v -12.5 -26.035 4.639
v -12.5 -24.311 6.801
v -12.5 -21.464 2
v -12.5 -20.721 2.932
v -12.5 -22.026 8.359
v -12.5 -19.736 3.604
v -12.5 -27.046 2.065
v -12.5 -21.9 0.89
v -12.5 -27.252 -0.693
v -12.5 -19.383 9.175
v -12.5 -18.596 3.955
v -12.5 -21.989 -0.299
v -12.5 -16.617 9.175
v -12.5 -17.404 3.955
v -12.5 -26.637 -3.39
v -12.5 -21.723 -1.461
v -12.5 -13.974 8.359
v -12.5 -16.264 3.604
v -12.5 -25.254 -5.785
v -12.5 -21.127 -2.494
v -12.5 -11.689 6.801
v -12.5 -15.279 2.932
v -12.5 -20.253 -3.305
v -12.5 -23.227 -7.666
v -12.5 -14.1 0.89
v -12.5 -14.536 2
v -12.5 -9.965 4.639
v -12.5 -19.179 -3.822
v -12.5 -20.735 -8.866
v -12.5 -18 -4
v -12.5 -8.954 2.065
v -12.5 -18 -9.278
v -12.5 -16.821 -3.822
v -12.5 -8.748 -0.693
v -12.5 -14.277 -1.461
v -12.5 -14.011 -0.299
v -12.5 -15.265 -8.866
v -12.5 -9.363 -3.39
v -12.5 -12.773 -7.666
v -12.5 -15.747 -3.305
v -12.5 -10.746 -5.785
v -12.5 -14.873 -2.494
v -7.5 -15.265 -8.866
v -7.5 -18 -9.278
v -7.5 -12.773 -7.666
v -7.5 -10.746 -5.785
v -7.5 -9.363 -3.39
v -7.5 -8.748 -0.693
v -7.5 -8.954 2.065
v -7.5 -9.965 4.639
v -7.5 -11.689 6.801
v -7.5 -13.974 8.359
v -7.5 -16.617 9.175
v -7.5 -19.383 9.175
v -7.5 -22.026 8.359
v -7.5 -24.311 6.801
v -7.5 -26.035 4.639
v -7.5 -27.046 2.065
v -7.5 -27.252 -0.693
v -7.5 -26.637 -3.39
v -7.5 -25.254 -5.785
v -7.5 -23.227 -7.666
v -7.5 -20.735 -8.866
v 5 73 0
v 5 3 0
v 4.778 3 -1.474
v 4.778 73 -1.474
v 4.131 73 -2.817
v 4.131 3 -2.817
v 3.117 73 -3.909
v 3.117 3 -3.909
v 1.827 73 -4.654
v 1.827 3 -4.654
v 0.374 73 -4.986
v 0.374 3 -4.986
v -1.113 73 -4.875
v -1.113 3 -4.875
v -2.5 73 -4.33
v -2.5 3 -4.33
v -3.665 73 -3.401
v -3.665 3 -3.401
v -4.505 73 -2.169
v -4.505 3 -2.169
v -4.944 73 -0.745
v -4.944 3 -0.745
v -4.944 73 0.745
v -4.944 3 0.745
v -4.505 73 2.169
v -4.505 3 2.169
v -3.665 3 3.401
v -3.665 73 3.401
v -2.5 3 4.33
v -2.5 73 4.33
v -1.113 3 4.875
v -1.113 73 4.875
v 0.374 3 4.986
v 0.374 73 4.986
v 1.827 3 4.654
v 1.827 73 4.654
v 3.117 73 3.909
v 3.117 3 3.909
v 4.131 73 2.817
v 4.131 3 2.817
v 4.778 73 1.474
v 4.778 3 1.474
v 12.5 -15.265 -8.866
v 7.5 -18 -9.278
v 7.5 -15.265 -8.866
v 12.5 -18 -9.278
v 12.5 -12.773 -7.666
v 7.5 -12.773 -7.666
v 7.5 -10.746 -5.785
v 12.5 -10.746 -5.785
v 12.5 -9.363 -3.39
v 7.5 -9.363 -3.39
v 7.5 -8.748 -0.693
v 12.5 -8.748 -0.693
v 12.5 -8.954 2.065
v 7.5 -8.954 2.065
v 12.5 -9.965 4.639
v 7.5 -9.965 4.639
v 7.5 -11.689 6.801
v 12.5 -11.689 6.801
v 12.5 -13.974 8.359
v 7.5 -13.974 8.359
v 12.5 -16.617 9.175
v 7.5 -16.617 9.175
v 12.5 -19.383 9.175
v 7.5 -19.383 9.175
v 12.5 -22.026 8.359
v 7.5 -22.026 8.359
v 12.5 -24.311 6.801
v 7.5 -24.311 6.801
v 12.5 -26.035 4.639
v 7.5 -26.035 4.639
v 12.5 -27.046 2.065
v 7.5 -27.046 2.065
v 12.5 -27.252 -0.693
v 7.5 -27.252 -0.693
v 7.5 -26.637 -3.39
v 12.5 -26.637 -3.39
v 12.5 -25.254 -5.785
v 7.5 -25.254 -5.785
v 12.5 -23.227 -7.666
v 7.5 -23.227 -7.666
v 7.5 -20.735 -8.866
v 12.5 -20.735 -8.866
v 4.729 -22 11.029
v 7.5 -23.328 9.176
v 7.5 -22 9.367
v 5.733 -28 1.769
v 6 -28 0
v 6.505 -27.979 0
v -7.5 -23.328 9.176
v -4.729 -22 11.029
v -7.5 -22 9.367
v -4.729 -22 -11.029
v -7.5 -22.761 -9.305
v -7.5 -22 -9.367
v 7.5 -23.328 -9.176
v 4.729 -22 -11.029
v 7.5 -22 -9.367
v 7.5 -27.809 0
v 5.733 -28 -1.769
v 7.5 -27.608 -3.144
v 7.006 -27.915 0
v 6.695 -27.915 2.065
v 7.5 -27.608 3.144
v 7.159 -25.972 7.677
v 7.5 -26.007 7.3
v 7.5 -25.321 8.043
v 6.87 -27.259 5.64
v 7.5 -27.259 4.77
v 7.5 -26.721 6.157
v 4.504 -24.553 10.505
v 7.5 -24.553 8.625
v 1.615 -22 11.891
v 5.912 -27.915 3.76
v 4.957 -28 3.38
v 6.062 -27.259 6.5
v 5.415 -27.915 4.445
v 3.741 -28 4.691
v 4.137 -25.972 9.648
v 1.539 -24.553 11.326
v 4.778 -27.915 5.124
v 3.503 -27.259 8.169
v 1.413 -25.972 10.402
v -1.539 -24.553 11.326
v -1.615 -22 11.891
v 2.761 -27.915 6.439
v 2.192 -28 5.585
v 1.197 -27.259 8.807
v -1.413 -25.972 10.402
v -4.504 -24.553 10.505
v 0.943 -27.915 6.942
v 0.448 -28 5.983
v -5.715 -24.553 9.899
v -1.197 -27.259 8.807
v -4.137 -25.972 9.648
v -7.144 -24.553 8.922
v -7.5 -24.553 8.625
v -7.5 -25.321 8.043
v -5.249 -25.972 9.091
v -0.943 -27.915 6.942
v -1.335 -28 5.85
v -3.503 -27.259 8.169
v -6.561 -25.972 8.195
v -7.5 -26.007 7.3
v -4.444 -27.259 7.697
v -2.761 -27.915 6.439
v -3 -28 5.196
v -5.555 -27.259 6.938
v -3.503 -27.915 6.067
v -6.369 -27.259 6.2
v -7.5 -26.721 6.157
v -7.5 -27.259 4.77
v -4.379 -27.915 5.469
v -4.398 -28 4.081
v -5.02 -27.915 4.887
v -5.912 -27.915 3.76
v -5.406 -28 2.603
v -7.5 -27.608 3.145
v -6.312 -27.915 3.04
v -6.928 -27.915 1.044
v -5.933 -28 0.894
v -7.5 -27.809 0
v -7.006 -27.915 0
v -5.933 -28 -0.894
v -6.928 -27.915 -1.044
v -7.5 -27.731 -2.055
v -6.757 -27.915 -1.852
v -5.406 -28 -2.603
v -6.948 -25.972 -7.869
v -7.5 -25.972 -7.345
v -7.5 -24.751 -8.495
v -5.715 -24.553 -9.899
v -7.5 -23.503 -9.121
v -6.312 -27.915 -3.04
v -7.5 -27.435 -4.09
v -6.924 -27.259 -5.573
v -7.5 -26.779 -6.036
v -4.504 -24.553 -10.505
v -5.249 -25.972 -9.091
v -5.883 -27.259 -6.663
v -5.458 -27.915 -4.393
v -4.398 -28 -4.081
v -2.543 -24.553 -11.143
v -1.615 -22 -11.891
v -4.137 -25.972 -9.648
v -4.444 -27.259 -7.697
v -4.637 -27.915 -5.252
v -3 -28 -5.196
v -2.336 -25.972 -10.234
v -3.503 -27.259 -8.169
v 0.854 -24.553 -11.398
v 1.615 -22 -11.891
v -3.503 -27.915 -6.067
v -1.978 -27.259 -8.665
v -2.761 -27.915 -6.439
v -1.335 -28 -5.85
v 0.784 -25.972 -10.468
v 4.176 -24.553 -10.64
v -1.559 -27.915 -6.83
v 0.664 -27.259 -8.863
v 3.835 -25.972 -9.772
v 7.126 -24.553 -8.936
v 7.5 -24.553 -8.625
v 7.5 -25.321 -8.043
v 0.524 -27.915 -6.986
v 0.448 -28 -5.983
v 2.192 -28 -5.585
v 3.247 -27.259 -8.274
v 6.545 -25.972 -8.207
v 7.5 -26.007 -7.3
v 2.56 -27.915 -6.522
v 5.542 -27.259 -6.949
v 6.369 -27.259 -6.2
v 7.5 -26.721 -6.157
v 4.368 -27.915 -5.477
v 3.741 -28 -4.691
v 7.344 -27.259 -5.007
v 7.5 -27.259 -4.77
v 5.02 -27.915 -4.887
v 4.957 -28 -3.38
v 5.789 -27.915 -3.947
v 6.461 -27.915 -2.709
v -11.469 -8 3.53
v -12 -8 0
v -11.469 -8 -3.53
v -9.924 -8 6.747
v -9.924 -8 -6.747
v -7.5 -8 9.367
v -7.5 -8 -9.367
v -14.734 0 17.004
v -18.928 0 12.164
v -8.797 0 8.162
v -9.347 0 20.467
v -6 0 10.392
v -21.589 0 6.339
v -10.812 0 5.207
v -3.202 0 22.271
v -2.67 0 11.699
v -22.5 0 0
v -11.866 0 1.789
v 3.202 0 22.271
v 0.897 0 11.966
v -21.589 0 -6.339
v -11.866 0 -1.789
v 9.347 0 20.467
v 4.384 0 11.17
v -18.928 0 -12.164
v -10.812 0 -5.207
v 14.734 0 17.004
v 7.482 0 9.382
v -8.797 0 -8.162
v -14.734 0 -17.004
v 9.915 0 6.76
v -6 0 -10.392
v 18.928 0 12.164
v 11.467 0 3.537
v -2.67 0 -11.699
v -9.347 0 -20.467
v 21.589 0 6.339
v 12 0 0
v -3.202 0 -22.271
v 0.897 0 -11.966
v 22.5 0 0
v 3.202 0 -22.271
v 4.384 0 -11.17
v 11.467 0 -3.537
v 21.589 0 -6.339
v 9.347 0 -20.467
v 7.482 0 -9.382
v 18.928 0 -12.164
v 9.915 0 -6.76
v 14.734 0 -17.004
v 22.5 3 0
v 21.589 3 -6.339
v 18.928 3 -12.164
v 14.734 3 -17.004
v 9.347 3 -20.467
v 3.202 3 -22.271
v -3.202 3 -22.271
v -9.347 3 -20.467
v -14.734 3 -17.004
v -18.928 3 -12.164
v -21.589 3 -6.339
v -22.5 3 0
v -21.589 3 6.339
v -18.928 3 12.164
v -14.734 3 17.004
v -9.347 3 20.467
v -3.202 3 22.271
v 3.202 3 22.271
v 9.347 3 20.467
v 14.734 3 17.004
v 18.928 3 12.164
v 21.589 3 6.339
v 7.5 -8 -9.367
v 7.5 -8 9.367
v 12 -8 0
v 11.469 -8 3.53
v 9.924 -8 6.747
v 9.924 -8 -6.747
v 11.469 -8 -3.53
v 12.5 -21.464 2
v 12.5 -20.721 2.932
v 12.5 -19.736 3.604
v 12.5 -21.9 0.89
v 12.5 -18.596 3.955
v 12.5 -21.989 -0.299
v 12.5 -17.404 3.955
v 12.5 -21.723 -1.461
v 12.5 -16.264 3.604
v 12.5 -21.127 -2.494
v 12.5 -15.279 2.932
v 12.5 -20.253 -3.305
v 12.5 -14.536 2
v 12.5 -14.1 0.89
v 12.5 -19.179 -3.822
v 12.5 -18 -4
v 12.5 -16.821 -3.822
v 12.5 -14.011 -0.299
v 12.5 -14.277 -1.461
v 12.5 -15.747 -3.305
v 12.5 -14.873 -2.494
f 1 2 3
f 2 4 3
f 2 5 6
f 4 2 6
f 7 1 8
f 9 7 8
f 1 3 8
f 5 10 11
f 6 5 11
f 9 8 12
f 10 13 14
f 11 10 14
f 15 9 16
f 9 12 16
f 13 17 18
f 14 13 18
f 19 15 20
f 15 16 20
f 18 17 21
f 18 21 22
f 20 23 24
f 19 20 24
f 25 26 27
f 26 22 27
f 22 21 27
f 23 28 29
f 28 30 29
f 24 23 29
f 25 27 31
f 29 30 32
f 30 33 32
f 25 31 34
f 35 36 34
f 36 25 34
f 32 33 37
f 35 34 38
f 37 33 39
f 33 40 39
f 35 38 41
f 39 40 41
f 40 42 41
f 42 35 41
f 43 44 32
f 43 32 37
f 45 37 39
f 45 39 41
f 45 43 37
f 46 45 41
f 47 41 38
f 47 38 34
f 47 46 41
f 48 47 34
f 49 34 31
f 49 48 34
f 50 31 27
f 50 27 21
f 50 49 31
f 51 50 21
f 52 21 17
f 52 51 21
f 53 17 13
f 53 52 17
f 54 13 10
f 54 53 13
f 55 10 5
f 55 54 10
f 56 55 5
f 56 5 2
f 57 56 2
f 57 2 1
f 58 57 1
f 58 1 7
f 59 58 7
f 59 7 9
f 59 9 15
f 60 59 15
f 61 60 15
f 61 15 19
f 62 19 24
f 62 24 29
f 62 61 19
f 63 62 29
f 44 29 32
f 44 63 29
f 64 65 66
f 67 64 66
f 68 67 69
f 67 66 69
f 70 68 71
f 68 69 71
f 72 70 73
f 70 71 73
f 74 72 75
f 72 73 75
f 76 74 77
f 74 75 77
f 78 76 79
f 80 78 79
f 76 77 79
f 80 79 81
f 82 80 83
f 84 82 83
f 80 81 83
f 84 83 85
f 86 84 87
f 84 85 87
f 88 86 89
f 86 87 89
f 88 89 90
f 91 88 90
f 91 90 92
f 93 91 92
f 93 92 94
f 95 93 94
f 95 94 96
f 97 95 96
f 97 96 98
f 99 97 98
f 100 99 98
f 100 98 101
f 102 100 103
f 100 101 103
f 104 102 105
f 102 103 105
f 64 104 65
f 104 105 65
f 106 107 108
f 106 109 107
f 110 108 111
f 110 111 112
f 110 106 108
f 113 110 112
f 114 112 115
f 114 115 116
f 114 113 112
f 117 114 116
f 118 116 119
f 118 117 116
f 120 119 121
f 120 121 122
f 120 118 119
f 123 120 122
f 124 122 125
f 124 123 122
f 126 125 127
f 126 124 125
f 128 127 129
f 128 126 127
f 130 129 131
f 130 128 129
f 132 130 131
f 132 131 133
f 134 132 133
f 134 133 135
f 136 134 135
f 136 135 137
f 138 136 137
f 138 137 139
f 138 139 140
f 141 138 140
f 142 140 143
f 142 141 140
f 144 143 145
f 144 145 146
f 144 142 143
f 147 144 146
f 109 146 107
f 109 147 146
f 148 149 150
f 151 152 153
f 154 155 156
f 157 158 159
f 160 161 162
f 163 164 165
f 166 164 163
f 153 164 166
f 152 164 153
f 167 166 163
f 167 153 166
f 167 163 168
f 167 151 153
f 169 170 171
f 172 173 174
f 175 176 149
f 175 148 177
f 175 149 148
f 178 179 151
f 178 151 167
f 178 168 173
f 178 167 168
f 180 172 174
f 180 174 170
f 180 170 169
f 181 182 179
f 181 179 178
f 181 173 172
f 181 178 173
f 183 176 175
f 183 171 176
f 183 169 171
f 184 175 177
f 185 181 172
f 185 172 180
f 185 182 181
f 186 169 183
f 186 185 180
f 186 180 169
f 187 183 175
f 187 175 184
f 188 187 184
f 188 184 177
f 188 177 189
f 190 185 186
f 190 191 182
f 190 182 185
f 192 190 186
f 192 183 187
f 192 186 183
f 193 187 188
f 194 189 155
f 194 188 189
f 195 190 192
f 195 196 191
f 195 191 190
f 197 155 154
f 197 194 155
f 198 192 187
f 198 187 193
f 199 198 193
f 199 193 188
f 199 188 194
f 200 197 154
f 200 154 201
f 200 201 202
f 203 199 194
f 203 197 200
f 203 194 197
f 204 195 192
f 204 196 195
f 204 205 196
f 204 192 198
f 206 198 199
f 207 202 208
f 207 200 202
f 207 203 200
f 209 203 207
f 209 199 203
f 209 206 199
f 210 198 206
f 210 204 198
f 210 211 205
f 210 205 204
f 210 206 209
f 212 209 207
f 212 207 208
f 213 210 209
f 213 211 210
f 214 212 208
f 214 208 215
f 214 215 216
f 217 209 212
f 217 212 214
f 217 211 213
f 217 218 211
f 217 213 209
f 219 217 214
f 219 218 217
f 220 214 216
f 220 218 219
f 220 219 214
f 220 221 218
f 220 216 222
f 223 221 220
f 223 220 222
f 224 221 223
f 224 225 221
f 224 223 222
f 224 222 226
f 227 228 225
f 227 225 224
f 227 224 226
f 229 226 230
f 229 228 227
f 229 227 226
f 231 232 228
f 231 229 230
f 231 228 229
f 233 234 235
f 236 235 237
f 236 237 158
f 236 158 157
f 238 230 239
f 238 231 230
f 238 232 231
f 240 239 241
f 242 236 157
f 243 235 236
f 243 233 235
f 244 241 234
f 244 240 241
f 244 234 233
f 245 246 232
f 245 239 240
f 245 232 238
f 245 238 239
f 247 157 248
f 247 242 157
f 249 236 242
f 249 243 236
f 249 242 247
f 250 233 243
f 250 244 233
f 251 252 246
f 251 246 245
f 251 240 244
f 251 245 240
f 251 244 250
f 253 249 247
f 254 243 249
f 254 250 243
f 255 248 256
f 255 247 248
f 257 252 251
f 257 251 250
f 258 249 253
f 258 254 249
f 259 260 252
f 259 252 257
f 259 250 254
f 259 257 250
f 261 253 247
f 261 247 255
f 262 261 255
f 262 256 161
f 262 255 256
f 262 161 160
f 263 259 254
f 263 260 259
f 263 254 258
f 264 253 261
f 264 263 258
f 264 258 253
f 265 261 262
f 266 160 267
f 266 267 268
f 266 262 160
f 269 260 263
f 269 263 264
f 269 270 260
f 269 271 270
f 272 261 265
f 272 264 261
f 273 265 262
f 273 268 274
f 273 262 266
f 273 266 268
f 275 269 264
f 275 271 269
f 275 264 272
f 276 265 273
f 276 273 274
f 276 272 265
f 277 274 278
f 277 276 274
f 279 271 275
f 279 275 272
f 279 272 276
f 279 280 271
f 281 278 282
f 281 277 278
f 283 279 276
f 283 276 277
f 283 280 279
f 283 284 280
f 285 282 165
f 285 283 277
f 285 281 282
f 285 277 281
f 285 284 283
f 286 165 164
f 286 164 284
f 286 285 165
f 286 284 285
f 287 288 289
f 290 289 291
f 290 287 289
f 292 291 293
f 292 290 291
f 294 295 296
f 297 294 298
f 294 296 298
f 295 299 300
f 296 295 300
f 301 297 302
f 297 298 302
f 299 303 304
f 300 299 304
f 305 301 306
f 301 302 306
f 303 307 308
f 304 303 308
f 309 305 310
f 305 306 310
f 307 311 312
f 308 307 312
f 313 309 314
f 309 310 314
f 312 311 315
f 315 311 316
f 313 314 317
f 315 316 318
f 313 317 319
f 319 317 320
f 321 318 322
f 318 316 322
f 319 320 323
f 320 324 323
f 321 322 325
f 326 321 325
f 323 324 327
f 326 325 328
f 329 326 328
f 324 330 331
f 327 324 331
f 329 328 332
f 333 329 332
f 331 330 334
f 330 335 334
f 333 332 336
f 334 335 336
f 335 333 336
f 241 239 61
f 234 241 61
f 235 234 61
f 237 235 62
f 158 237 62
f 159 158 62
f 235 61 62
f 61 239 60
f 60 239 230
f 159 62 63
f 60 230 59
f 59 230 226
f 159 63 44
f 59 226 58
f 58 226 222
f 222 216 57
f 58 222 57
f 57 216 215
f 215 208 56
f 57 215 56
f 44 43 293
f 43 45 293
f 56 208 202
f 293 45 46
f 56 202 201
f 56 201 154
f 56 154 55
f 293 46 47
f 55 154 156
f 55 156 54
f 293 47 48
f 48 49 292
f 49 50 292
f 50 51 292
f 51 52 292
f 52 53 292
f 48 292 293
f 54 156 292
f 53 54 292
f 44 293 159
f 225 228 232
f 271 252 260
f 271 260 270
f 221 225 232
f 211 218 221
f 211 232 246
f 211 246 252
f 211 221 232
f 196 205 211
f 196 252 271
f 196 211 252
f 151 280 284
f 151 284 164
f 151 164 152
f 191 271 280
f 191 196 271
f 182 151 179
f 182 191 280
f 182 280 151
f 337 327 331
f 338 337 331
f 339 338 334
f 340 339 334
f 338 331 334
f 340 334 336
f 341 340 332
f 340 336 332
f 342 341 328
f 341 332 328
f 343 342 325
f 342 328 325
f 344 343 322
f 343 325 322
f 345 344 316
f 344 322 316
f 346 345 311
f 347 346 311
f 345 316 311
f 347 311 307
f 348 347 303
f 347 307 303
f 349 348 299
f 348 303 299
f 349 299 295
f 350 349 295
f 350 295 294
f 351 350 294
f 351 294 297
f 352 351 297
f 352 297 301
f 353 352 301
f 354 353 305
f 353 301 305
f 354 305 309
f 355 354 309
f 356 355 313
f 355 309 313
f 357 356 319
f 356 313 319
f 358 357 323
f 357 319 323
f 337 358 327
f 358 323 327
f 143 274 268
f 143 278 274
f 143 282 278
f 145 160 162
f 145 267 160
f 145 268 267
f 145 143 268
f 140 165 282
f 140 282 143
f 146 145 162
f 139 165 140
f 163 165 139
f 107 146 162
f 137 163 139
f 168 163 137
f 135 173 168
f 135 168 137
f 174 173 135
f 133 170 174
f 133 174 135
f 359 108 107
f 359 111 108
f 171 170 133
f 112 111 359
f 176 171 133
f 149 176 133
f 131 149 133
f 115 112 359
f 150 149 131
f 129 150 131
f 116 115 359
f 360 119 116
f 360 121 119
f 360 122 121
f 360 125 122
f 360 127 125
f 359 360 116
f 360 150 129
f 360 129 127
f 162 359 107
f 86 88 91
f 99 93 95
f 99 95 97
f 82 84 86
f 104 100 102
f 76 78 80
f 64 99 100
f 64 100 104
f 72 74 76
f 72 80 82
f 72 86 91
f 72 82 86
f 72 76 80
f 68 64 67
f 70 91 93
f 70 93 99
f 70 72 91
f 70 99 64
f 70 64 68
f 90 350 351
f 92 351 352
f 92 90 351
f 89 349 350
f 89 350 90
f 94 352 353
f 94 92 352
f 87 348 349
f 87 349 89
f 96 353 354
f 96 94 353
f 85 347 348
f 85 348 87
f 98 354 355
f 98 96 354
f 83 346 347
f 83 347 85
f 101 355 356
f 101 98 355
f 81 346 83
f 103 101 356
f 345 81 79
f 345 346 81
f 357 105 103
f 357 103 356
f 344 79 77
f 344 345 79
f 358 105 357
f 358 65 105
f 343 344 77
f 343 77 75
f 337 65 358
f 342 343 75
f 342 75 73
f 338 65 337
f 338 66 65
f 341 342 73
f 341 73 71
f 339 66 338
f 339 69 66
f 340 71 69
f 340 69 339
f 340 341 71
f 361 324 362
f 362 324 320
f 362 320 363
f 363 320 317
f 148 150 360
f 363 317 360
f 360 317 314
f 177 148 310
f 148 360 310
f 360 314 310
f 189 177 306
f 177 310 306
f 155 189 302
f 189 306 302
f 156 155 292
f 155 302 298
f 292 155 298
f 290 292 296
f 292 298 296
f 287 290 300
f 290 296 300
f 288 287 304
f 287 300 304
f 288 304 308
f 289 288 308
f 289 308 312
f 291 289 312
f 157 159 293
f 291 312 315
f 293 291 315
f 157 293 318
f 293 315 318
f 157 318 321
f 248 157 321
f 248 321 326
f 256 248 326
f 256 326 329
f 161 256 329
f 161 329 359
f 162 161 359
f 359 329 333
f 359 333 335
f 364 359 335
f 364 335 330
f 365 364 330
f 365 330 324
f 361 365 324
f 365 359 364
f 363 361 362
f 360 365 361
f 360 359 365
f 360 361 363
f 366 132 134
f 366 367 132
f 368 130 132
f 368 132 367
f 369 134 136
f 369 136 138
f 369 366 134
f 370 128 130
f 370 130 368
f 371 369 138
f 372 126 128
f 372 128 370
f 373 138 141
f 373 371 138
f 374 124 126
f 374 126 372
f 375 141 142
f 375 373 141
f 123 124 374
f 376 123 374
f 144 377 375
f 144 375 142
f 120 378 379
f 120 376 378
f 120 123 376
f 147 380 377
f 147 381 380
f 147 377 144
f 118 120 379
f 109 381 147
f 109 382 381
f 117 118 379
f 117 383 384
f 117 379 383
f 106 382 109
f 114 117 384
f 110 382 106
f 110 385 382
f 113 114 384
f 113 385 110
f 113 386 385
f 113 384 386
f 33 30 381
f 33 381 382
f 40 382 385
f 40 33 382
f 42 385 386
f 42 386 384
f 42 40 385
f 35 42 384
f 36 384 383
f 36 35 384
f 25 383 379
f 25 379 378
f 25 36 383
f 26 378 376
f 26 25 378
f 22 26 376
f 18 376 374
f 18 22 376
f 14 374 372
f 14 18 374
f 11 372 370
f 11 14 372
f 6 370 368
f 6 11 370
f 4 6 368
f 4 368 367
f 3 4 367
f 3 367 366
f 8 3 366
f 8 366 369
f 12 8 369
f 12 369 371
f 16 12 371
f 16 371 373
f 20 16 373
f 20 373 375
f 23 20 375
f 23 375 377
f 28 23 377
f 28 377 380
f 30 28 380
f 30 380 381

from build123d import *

# Parameters (mm, degrees)
SKETCH1_R               = 22.5
BOSS_EXTRUDE3_DEPTH     = 3
SKETCH3_R               = 5
BOSS_EXTRUDE4_DEPTH     = 70
SKETCH4_R               = 12
BOSS_EXTRUDE5_DEPTH     = 28
FILLET1_R               = 6
SKETCH6_W               = 20
SKETCH6_H               = 20
CUT_EXTRUDE1_DEPTH      = 23.5
CUT_EXTRUDE1_DEPTH_BACK = 23.5
SKETCH7_R               = 4
CUT_EXTRUDE2_DEPTH      = 28
SKETCH10_R              = 9.27822292
SKETCH10_R_2            = 4
BOSS_EXTRUDE6_DEPTH     = 12.5


with BuildPart() as part:
    # Sketch1 → Boss-Extrude3 (new body)
    with BuildSketch(Plane(origin=(0, 0, 0), x_dir=(1, 0, 0), z_dir=(0, 1, 0))):
        Circle(SKETCH1_R)
    extrude(amount=BOSS_EXTRUDE3_DEPTH)

    # Sketch3 → Boss-Extrude4 (add)
    with BuildSketch(Plane(origin=(0, 3, 0), x_dir=(1, 0, 0), z_dir=(0, 1, 0))):
        Circle(SKETCH3_R)
    extrude(amount=BOSS_EXTRUDE4_DEPTH)

    # Sketch4 → Boss-Extrude5 (add)
    with BuildSketch(Plane.XZ):
        Circle(SKETCH4_R)
    extrude(amount=BOSS_EXTRUDE5_DEPTH)

    # Fillet1
    fillet1_edges = [part.edges().sort_by_distance(p)[0] for p in [
        (-12, -28, 0),
    ]]
    fillet(fillet1_edges, radius=FILLET1_R)

    # Sketch6 → Cut-Extrude1 (cut, two sides)
    with BuildSketch(Plane.XY) as cut_extrude1_sk:
        with Locations((17.5, -18)):
            Rectangle(SKETCH6_W, SKETCH6_H)
        with Locations((-17.5, -18)):
            Rectangle(SKETCH6_W, SKETCH6_H)
    extrude(amount=CUT_EXTRUDE1_DEPTH, mode=Mode.SUBTRACT)
    extrude(cut_extrude1_sk.sketch, amount=-CUT_EXTRUDE1_DEPTH_BACK, mode=Mode.SUBTRACT)

    # Sketch7 → Cut-Extrude2 (cut)
    with BuildSketch(Plane(origin=(7.5, 0, 0), x_dir=(0, 0, -1), z_dir=(1, 0, 0))):
        with Locations((0, -18)):
            Circle(SKETCH7_R)
    extrude(amount=-CUT_EXTRUDE2_DEPTH, mode=Mode.SUBTRACT)

    # Sketch10 → Boss-Extrude6 (add, symmetric)
    with BuildSketch(Plane(origin=(0, 0, 0), x_dir=(0, 0, -1), z_dir=(1, 0, 0))):
        with Locations((0, -18)):
            Circle(SKETCH10_R)
        with Locations((0, -18)):
            Circle(SKETCH10_R_2, mode=Mode.SUBTRACT)
    extrude(amount=BOSS_EXTRUDE6_DEPTH, both=True)


solid = part.part
